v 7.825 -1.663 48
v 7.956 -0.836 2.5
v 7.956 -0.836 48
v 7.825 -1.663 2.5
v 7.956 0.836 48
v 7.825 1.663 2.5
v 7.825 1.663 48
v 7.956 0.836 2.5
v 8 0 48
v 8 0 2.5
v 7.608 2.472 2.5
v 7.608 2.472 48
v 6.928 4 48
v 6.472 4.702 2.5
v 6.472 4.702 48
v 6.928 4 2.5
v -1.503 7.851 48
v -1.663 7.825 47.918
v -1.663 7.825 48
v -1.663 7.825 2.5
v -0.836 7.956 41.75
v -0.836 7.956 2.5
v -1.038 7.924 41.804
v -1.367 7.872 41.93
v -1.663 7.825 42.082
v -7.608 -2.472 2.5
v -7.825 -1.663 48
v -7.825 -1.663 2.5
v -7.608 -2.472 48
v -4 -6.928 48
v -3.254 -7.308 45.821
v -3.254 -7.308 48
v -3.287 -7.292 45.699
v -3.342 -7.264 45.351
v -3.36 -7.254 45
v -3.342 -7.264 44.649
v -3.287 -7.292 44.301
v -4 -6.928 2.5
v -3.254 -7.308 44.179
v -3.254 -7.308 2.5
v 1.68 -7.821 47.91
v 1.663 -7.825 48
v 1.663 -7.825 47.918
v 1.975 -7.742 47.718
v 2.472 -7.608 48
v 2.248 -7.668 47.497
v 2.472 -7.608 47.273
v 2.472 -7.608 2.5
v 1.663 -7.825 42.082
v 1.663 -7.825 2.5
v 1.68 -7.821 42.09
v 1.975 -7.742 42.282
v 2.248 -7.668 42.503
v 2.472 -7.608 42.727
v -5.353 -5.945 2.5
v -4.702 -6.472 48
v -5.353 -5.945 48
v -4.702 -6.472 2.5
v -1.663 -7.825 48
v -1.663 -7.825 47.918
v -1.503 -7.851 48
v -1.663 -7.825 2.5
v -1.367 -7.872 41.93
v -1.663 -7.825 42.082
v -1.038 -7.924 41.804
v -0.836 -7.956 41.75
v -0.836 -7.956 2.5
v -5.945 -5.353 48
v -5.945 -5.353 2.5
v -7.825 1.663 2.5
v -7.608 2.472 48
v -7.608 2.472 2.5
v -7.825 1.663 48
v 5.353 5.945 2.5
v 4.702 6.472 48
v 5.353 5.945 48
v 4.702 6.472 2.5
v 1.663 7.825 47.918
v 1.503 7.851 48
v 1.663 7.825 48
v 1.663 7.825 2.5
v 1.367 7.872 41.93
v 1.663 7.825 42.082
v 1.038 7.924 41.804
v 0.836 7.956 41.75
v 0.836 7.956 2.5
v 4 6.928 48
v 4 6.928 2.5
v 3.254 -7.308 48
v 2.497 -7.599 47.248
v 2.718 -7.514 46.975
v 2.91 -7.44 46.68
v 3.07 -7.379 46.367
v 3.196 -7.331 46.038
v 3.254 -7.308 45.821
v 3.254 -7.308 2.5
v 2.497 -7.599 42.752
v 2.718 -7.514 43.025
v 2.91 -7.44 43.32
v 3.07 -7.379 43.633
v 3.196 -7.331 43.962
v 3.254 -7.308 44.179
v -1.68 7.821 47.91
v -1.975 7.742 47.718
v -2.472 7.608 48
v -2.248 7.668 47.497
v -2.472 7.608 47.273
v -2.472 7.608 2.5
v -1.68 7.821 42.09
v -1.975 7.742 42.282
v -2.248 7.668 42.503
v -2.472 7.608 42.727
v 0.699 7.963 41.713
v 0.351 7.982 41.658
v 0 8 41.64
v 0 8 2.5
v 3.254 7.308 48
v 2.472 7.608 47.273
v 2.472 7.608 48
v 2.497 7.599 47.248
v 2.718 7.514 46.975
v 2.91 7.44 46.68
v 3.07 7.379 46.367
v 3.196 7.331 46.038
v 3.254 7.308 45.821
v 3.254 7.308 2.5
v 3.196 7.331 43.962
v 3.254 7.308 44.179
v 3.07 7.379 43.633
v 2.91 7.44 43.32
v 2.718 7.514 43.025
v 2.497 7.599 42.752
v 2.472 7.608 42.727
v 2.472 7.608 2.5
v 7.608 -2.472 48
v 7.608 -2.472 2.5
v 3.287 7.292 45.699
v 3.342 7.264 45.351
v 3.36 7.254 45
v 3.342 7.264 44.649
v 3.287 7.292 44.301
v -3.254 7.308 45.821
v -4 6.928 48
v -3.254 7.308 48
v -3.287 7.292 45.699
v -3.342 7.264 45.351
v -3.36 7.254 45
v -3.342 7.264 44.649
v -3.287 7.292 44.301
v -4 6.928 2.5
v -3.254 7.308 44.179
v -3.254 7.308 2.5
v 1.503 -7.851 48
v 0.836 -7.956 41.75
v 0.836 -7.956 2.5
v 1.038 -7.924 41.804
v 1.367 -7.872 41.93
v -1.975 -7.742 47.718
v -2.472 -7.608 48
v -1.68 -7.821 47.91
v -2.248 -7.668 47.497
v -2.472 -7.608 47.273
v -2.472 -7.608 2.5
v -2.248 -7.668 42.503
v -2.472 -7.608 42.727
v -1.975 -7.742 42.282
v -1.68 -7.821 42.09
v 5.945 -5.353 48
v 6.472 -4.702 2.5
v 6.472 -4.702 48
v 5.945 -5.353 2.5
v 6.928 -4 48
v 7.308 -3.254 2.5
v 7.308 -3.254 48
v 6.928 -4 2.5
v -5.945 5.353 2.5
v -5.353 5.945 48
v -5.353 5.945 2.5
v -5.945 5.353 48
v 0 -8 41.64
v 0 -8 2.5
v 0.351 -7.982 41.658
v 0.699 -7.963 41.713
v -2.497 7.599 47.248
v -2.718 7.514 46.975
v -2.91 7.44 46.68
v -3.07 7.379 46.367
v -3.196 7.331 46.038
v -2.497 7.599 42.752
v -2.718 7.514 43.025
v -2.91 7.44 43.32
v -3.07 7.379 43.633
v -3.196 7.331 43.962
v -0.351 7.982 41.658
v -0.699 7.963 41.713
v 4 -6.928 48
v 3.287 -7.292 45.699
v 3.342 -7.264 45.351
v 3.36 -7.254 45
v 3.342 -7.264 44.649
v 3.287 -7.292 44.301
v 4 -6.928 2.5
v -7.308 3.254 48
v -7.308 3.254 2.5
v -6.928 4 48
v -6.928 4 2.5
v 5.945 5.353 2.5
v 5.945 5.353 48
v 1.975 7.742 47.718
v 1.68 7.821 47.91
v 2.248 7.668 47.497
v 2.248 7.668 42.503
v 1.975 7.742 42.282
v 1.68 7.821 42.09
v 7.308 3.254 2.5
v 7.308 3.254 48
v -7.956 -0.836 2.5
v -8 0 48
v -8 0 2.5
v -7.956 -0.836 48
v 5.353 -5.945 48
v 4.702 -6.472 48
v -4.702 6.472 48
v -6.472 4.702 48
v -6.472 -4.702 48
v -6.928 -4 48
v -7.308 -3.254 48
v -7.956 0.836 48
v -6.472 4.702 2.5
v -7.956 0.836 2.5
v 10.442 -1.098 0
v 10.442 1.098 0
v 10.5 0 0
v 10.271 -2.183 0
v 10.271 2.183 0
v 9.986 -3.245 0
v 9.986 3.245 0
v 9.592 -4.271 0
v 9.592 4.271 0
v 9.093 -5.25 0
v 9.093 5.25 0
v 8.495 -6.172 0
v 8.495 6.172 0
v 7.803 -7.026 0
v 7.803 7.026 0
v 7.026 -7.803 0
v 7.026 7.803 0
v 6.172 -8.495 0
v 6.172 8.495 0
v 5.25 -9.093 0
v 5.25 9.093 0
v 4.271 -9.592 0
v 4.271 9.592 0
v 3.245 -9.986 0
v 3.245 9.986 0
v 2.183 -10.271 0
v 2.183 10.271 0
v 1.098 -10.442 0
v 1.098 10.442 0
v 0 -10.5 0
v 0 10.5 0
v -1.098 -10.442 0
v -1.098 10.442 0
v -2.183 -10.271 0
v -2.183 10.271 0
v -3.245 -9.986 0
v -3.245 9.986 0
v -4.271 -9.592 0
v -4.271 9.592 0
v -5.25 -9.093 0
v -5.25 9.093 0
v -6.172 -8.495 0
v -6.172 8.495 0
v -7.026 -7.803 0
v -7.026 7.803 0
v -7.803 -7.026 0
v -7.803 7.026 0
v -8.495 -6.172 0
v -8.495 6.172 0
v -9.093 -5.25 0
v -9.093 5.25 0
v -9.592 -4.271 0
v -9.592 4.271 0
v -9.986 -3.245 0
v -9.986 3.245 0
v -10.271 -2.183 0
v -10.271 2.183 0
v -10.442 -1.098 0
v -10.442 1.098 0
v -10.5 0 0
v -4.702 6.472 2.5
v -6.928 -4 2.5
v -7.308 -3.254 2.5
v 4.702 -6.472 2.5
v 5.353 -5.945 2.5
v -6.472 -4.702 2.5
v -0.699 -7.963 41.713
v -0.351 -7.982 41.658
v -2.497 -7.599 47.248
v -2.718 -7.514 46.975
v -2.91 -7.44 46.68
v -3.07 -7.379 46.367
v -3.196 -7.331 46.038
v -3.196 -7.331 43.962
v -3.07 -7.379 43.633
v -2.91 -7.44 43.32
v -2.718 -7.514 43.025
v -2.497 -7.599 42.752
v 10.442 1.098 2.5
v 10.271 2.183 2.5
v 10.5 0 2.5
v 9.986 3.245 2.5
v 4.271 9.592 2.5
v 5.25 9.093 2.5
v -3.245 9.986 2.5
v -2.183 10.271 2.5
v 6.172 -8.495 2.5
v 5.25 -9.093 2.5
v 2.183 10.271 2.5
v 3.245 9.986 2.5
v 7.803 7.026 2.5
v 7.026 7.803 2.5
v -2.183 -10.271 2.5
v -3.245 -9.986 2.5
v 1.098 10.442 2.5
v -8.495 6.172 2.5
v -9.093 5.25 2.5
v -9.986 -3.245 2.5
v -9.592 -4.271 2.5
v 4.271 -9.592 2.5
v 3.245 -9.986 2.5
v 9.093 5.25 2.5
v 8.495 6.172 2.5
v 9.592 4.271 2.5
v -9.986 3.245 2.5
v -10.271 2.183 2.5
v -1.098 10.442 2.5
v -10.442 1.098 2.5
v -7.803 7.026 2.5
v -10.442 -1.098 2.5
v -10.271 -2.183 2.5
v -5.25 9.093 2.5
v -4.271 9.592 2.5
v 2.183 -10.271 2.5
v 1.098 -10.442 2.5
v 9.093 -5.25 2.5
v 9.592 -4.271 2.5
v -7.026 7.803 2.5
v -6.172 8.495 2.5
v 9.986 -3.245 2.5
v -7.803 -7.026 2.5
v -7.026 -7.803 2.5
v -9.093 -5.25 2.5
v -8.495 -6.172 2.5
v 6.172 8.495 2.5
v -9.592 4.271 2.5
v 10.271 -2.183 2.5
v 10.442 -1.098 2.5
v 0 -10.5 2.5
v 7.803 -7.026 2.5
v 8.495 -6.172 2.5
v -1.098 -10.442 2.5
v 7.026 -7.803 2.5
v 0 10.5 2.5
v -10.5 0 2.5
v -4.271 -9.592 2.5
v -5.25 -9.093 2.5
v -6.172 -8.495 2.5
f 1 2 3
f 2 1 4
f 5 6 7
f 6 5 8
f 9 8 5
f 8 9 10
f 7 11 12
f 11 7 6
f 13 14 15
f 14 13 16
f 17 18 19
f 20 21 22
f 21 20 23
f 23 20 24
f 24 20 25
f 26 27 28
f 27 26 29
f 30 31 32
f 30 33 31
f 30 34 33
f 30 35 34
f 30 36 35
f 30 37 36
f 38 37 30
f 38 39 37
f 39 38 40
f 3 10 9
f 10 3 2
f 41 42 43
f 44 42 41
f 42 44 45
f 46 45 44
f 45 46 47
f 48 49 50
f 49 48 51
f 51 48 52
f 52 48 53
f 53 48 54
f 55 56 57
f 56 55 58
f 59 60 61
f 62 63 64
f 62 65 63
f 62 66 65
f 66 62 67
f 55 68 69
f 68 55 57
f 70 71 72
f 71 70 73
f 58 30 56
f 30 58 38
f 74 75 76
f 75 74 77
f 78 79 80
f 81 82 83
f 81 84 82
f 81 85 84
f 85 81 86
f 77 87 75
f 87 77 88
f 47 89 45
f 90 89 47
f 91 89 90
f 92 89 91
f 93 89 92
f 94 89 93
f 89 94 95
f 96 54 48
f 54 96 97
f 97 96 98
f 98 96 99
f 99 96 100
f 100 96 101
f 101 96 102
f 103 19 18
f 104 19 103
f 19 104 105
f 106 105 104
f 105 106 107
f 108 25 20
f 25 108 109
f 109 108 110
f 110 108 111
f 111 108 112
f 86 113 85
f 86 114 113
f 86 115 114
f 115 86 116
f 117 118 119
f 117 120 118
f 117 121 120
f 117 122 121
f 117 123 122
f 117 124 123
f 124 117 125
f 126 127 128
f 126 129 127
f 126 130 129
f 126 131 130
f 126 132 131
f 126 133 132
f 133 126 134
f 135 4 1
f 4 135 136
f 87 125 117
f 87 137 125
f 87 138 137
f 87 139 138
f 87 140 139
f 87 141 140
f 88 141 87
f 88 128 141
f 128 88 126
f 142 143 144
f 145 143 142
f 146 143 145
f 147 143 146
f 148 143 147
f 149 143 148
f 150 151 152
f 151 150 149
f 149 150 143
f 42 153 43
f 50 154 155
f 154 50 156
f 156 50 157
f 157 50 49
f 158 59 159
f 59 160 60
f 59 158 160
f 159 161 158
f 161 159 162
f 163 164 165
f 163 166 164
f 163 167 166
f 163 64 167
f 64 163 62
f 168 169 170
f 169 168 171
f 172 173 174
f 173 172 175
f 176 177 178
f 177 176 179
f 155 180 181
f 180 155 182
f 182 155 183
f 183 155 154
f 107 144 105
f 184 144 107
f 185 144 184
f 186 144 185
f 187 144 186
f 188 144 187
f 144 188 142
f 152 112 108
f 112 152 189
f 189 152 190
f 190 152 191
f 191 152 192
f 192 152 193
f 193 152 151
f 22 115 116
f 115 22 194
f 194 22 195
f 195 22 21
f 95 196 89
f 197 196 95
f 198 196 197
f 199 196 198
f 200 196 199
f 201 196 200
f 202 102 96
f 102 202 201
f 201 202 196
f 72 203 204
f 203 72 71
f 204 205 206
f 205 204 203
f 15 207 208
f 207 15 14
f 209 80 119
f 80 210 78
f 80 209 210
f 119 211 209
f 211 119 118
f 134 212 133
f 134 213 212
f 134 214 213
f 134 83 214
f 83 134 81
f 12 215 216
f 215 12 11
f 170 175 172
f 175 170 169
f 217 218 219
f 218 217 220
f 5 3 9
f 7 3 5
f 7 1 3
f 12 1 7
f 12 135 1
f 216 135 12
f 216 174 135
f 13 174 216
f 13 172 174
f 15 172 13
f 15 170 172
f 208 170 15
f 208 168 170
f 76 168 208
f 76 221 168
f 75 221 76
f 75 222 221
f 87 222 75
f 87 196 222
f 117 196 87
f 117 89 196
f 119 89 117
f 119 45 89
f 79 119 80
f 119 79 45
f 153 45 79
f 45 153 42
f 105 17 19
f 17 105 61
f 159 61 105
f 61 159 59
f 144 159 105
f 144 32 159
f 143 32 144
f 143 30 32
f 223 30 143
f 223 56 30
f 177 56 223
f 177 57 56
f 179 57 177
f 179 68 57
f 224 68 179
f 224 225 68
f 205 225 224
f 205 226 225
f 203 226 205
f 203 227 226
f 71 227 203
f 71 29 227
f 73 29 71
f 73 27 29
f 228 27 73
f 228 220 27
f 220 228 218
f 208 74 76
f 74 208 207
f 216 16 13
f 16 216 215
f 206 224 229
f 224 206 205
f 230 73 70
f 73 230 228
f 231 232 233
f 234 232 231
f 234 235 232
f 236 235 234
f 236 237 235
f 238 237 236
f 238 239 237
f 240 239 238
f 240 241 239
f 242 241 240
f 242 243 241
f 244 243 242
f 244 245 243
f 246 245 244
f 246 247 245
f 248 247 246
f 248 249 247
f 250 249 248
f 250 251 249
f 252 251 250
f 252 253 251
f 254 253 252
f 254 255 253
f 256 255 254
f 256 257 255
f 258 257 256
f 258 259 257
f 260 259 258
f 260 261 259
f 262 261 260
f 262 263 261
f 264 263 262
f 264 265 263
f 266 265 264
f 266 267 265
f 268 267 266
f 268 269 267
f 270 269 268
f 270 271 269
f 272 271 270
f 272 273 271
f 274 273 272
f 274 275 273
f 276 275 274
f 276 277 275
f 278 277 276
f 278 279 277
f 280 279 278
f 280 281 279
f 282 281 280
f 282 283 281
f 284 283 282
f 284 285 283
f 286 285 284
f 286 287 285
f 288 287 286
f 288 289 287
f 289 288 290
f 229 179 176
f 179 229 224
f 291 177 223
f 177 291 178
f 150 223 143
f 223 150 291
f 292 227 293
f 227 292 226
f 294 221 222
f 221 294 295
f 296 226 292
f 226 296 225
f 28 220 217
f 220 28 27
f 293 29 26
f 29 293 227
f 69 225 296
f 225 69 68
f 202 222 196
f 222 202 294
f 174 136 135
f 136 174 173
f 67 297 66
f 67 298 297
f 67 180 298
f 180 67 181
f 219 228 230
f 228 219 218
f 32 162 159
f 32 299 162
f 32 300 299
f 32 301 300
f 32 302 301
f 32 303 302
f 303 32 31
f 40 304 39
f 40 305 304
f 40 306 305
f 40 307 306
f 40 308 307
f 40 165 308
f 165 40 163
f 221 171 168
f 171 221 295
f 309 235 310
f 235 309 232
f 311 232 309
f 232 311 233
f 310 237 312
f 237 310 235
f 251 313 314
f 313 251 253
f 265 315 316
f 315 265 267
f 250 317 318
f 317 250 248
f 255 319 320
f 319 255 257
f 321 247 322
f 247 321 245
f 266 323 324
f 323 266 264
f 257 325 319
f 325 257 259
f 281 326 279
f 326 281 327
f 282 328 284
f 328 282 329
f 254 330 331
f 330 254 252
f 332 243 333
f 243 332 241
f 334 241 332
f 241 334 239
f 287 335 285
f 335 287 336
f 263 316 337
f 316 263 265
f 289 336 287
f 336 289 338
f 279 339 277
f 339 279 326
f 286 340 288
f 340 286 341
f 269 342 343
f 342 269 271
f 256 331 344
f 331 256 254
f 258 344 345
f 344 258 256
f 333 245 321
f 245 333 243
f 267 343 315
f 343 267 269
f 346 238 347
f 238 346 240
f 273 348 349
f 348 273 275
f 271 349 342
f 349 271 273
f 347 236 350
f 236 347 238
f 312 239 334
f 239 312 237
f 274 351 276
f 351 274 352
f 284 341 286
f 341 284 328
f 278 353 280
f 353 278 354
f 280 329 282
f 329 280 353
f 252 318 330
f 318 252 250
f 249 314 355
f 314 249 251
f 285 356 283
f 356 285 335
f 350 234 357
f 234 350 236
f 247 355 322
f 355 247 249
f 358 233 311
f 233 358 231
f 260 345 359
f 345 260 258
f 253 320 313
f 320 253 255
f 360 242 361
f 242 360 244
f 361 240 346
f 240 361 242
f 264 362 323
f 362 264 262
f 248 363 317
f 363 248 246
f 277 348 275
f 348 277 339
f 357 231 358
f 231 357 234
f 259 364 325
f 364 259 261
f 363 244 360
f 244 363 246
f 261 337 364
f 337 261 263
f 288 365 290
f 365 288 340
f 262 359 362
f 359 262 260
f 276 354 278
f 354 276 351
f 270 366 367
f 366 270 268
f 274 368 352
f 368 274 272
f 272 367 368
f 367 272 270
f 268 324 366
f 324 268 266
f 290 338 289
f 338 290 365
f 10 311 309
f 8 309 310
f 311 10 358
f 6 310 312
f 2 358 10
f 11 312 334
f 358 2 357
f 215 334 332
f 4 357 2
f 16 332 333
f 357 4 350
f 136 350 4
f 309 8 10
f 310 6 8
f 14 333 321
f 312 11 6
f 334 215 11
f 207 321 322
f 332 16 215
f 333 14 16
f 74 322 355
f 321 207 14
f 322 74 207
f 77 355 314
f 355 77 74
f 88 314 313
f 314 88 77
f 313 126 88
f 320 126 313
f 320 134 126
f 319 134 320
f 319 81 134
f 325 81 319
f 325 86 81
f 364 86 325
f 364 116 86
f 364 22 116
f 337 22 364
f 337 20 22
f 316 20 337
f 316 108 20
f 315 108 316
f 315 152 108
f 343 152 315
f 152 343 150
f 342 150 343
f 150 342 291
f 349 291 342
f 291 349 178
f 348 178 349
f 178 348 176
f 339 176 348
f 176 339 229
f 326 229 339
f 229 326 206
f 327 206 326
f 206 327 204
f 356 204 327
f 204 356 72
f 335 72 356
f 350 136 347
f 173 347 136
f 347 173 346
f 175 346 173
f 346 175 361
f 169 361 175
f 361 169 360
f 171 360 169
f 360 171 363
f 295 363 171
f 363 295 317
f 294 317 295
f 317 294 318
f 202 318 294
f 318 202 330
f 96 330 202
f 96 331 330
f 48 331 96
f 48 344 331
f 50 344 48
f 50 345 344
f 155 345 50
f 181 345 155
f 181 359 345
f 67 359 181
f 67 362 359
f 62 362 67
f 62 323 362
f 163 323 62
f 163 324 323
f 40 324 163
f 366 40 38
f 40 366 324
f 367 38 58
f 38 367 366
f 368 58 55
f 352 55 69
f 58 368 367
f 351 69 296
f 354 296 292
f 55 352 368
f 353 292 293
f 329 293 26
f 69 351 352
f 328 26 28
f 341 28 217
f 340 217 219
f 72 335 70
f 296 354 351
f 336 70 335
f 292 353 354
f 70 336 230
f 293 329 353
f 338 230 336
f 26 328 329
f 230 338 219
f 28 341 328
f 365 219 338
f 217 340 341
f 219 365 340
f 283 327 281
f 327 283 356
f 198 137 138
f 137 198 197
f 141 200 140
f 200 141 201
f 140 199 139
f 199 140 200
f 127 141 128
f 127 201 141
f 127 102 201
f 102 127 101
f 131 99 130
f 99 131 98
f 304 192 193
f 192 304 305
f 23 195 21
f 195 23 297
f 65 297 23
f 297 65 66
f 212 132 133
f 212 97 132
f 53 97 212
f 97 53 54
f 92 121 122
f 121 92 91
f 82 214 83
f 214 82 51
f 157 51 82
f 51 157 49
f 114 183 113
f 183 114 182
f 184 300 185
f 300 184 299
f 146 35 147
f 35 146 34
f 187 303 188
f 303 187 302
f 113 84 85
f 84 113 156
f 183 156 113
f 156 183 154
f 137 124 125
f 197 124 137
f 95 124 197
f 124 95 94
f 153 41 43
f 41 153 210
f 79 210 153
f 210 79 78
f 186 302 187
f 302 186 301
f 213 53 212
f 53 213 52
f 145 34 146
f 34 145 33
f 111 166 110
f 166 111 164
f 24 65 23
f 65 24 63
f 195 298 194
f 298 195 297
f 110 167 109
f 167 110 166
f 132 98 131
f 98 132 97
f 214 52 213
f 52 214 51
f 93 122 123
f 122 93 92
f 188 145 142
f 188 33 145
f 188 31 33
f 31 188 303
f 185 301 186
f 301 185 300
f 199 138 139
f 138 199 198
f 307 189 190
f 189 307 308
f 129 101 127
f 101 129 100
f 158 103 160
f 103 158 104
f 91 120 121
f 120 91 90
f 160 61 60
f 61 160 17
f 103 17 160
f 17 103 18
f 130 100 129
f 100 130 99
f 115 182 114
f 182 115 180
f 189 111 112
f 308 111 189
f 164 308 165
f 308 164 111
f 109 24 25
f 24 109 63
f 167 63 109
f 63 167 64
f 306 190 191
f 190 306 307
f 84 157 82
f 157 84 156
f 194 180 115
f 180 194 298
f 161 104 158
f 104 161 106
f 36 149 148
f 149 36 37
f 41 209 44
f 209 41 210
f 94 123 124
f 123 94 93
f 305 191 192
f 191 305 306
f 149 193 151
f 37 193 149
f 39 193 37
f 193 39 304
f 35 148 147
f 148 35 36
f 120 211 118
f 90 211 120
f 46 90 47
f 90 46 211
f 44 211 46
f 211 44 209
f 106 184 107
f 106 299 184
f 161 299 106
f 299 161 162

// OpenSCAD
// Clevis pin with cross-hole.
$fn = 60;
eps = 0.02;
pin_d = 16;
pin_l = 48;
head_d = pin_d + 5;
difference() {
    union() { cylinder(d=pin_d,h=pin_l); cylinder(d=head_d,h=2.5); }
    translate([0,-pin_d-eps,pin_l-3]) rotate([-90,0,0]) cylinder(d=pin_d*0.42,h=2*pin_d+2*eps);
}
